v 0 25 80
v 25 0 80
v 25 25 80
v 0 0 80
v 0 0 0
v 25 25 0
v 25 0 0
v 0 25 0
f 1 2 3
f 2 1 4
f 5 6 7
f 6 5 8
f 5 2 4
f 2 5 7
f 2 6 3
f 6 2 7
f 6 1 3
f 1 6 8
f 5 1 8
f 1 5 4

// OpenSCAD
$fa = 0.5; // default minimum facet angle is now 0.5
$fs = 0.5; // default minimum facet size is now 0.5 

height = 80;
width = 25;

cube([25,25,80]);
